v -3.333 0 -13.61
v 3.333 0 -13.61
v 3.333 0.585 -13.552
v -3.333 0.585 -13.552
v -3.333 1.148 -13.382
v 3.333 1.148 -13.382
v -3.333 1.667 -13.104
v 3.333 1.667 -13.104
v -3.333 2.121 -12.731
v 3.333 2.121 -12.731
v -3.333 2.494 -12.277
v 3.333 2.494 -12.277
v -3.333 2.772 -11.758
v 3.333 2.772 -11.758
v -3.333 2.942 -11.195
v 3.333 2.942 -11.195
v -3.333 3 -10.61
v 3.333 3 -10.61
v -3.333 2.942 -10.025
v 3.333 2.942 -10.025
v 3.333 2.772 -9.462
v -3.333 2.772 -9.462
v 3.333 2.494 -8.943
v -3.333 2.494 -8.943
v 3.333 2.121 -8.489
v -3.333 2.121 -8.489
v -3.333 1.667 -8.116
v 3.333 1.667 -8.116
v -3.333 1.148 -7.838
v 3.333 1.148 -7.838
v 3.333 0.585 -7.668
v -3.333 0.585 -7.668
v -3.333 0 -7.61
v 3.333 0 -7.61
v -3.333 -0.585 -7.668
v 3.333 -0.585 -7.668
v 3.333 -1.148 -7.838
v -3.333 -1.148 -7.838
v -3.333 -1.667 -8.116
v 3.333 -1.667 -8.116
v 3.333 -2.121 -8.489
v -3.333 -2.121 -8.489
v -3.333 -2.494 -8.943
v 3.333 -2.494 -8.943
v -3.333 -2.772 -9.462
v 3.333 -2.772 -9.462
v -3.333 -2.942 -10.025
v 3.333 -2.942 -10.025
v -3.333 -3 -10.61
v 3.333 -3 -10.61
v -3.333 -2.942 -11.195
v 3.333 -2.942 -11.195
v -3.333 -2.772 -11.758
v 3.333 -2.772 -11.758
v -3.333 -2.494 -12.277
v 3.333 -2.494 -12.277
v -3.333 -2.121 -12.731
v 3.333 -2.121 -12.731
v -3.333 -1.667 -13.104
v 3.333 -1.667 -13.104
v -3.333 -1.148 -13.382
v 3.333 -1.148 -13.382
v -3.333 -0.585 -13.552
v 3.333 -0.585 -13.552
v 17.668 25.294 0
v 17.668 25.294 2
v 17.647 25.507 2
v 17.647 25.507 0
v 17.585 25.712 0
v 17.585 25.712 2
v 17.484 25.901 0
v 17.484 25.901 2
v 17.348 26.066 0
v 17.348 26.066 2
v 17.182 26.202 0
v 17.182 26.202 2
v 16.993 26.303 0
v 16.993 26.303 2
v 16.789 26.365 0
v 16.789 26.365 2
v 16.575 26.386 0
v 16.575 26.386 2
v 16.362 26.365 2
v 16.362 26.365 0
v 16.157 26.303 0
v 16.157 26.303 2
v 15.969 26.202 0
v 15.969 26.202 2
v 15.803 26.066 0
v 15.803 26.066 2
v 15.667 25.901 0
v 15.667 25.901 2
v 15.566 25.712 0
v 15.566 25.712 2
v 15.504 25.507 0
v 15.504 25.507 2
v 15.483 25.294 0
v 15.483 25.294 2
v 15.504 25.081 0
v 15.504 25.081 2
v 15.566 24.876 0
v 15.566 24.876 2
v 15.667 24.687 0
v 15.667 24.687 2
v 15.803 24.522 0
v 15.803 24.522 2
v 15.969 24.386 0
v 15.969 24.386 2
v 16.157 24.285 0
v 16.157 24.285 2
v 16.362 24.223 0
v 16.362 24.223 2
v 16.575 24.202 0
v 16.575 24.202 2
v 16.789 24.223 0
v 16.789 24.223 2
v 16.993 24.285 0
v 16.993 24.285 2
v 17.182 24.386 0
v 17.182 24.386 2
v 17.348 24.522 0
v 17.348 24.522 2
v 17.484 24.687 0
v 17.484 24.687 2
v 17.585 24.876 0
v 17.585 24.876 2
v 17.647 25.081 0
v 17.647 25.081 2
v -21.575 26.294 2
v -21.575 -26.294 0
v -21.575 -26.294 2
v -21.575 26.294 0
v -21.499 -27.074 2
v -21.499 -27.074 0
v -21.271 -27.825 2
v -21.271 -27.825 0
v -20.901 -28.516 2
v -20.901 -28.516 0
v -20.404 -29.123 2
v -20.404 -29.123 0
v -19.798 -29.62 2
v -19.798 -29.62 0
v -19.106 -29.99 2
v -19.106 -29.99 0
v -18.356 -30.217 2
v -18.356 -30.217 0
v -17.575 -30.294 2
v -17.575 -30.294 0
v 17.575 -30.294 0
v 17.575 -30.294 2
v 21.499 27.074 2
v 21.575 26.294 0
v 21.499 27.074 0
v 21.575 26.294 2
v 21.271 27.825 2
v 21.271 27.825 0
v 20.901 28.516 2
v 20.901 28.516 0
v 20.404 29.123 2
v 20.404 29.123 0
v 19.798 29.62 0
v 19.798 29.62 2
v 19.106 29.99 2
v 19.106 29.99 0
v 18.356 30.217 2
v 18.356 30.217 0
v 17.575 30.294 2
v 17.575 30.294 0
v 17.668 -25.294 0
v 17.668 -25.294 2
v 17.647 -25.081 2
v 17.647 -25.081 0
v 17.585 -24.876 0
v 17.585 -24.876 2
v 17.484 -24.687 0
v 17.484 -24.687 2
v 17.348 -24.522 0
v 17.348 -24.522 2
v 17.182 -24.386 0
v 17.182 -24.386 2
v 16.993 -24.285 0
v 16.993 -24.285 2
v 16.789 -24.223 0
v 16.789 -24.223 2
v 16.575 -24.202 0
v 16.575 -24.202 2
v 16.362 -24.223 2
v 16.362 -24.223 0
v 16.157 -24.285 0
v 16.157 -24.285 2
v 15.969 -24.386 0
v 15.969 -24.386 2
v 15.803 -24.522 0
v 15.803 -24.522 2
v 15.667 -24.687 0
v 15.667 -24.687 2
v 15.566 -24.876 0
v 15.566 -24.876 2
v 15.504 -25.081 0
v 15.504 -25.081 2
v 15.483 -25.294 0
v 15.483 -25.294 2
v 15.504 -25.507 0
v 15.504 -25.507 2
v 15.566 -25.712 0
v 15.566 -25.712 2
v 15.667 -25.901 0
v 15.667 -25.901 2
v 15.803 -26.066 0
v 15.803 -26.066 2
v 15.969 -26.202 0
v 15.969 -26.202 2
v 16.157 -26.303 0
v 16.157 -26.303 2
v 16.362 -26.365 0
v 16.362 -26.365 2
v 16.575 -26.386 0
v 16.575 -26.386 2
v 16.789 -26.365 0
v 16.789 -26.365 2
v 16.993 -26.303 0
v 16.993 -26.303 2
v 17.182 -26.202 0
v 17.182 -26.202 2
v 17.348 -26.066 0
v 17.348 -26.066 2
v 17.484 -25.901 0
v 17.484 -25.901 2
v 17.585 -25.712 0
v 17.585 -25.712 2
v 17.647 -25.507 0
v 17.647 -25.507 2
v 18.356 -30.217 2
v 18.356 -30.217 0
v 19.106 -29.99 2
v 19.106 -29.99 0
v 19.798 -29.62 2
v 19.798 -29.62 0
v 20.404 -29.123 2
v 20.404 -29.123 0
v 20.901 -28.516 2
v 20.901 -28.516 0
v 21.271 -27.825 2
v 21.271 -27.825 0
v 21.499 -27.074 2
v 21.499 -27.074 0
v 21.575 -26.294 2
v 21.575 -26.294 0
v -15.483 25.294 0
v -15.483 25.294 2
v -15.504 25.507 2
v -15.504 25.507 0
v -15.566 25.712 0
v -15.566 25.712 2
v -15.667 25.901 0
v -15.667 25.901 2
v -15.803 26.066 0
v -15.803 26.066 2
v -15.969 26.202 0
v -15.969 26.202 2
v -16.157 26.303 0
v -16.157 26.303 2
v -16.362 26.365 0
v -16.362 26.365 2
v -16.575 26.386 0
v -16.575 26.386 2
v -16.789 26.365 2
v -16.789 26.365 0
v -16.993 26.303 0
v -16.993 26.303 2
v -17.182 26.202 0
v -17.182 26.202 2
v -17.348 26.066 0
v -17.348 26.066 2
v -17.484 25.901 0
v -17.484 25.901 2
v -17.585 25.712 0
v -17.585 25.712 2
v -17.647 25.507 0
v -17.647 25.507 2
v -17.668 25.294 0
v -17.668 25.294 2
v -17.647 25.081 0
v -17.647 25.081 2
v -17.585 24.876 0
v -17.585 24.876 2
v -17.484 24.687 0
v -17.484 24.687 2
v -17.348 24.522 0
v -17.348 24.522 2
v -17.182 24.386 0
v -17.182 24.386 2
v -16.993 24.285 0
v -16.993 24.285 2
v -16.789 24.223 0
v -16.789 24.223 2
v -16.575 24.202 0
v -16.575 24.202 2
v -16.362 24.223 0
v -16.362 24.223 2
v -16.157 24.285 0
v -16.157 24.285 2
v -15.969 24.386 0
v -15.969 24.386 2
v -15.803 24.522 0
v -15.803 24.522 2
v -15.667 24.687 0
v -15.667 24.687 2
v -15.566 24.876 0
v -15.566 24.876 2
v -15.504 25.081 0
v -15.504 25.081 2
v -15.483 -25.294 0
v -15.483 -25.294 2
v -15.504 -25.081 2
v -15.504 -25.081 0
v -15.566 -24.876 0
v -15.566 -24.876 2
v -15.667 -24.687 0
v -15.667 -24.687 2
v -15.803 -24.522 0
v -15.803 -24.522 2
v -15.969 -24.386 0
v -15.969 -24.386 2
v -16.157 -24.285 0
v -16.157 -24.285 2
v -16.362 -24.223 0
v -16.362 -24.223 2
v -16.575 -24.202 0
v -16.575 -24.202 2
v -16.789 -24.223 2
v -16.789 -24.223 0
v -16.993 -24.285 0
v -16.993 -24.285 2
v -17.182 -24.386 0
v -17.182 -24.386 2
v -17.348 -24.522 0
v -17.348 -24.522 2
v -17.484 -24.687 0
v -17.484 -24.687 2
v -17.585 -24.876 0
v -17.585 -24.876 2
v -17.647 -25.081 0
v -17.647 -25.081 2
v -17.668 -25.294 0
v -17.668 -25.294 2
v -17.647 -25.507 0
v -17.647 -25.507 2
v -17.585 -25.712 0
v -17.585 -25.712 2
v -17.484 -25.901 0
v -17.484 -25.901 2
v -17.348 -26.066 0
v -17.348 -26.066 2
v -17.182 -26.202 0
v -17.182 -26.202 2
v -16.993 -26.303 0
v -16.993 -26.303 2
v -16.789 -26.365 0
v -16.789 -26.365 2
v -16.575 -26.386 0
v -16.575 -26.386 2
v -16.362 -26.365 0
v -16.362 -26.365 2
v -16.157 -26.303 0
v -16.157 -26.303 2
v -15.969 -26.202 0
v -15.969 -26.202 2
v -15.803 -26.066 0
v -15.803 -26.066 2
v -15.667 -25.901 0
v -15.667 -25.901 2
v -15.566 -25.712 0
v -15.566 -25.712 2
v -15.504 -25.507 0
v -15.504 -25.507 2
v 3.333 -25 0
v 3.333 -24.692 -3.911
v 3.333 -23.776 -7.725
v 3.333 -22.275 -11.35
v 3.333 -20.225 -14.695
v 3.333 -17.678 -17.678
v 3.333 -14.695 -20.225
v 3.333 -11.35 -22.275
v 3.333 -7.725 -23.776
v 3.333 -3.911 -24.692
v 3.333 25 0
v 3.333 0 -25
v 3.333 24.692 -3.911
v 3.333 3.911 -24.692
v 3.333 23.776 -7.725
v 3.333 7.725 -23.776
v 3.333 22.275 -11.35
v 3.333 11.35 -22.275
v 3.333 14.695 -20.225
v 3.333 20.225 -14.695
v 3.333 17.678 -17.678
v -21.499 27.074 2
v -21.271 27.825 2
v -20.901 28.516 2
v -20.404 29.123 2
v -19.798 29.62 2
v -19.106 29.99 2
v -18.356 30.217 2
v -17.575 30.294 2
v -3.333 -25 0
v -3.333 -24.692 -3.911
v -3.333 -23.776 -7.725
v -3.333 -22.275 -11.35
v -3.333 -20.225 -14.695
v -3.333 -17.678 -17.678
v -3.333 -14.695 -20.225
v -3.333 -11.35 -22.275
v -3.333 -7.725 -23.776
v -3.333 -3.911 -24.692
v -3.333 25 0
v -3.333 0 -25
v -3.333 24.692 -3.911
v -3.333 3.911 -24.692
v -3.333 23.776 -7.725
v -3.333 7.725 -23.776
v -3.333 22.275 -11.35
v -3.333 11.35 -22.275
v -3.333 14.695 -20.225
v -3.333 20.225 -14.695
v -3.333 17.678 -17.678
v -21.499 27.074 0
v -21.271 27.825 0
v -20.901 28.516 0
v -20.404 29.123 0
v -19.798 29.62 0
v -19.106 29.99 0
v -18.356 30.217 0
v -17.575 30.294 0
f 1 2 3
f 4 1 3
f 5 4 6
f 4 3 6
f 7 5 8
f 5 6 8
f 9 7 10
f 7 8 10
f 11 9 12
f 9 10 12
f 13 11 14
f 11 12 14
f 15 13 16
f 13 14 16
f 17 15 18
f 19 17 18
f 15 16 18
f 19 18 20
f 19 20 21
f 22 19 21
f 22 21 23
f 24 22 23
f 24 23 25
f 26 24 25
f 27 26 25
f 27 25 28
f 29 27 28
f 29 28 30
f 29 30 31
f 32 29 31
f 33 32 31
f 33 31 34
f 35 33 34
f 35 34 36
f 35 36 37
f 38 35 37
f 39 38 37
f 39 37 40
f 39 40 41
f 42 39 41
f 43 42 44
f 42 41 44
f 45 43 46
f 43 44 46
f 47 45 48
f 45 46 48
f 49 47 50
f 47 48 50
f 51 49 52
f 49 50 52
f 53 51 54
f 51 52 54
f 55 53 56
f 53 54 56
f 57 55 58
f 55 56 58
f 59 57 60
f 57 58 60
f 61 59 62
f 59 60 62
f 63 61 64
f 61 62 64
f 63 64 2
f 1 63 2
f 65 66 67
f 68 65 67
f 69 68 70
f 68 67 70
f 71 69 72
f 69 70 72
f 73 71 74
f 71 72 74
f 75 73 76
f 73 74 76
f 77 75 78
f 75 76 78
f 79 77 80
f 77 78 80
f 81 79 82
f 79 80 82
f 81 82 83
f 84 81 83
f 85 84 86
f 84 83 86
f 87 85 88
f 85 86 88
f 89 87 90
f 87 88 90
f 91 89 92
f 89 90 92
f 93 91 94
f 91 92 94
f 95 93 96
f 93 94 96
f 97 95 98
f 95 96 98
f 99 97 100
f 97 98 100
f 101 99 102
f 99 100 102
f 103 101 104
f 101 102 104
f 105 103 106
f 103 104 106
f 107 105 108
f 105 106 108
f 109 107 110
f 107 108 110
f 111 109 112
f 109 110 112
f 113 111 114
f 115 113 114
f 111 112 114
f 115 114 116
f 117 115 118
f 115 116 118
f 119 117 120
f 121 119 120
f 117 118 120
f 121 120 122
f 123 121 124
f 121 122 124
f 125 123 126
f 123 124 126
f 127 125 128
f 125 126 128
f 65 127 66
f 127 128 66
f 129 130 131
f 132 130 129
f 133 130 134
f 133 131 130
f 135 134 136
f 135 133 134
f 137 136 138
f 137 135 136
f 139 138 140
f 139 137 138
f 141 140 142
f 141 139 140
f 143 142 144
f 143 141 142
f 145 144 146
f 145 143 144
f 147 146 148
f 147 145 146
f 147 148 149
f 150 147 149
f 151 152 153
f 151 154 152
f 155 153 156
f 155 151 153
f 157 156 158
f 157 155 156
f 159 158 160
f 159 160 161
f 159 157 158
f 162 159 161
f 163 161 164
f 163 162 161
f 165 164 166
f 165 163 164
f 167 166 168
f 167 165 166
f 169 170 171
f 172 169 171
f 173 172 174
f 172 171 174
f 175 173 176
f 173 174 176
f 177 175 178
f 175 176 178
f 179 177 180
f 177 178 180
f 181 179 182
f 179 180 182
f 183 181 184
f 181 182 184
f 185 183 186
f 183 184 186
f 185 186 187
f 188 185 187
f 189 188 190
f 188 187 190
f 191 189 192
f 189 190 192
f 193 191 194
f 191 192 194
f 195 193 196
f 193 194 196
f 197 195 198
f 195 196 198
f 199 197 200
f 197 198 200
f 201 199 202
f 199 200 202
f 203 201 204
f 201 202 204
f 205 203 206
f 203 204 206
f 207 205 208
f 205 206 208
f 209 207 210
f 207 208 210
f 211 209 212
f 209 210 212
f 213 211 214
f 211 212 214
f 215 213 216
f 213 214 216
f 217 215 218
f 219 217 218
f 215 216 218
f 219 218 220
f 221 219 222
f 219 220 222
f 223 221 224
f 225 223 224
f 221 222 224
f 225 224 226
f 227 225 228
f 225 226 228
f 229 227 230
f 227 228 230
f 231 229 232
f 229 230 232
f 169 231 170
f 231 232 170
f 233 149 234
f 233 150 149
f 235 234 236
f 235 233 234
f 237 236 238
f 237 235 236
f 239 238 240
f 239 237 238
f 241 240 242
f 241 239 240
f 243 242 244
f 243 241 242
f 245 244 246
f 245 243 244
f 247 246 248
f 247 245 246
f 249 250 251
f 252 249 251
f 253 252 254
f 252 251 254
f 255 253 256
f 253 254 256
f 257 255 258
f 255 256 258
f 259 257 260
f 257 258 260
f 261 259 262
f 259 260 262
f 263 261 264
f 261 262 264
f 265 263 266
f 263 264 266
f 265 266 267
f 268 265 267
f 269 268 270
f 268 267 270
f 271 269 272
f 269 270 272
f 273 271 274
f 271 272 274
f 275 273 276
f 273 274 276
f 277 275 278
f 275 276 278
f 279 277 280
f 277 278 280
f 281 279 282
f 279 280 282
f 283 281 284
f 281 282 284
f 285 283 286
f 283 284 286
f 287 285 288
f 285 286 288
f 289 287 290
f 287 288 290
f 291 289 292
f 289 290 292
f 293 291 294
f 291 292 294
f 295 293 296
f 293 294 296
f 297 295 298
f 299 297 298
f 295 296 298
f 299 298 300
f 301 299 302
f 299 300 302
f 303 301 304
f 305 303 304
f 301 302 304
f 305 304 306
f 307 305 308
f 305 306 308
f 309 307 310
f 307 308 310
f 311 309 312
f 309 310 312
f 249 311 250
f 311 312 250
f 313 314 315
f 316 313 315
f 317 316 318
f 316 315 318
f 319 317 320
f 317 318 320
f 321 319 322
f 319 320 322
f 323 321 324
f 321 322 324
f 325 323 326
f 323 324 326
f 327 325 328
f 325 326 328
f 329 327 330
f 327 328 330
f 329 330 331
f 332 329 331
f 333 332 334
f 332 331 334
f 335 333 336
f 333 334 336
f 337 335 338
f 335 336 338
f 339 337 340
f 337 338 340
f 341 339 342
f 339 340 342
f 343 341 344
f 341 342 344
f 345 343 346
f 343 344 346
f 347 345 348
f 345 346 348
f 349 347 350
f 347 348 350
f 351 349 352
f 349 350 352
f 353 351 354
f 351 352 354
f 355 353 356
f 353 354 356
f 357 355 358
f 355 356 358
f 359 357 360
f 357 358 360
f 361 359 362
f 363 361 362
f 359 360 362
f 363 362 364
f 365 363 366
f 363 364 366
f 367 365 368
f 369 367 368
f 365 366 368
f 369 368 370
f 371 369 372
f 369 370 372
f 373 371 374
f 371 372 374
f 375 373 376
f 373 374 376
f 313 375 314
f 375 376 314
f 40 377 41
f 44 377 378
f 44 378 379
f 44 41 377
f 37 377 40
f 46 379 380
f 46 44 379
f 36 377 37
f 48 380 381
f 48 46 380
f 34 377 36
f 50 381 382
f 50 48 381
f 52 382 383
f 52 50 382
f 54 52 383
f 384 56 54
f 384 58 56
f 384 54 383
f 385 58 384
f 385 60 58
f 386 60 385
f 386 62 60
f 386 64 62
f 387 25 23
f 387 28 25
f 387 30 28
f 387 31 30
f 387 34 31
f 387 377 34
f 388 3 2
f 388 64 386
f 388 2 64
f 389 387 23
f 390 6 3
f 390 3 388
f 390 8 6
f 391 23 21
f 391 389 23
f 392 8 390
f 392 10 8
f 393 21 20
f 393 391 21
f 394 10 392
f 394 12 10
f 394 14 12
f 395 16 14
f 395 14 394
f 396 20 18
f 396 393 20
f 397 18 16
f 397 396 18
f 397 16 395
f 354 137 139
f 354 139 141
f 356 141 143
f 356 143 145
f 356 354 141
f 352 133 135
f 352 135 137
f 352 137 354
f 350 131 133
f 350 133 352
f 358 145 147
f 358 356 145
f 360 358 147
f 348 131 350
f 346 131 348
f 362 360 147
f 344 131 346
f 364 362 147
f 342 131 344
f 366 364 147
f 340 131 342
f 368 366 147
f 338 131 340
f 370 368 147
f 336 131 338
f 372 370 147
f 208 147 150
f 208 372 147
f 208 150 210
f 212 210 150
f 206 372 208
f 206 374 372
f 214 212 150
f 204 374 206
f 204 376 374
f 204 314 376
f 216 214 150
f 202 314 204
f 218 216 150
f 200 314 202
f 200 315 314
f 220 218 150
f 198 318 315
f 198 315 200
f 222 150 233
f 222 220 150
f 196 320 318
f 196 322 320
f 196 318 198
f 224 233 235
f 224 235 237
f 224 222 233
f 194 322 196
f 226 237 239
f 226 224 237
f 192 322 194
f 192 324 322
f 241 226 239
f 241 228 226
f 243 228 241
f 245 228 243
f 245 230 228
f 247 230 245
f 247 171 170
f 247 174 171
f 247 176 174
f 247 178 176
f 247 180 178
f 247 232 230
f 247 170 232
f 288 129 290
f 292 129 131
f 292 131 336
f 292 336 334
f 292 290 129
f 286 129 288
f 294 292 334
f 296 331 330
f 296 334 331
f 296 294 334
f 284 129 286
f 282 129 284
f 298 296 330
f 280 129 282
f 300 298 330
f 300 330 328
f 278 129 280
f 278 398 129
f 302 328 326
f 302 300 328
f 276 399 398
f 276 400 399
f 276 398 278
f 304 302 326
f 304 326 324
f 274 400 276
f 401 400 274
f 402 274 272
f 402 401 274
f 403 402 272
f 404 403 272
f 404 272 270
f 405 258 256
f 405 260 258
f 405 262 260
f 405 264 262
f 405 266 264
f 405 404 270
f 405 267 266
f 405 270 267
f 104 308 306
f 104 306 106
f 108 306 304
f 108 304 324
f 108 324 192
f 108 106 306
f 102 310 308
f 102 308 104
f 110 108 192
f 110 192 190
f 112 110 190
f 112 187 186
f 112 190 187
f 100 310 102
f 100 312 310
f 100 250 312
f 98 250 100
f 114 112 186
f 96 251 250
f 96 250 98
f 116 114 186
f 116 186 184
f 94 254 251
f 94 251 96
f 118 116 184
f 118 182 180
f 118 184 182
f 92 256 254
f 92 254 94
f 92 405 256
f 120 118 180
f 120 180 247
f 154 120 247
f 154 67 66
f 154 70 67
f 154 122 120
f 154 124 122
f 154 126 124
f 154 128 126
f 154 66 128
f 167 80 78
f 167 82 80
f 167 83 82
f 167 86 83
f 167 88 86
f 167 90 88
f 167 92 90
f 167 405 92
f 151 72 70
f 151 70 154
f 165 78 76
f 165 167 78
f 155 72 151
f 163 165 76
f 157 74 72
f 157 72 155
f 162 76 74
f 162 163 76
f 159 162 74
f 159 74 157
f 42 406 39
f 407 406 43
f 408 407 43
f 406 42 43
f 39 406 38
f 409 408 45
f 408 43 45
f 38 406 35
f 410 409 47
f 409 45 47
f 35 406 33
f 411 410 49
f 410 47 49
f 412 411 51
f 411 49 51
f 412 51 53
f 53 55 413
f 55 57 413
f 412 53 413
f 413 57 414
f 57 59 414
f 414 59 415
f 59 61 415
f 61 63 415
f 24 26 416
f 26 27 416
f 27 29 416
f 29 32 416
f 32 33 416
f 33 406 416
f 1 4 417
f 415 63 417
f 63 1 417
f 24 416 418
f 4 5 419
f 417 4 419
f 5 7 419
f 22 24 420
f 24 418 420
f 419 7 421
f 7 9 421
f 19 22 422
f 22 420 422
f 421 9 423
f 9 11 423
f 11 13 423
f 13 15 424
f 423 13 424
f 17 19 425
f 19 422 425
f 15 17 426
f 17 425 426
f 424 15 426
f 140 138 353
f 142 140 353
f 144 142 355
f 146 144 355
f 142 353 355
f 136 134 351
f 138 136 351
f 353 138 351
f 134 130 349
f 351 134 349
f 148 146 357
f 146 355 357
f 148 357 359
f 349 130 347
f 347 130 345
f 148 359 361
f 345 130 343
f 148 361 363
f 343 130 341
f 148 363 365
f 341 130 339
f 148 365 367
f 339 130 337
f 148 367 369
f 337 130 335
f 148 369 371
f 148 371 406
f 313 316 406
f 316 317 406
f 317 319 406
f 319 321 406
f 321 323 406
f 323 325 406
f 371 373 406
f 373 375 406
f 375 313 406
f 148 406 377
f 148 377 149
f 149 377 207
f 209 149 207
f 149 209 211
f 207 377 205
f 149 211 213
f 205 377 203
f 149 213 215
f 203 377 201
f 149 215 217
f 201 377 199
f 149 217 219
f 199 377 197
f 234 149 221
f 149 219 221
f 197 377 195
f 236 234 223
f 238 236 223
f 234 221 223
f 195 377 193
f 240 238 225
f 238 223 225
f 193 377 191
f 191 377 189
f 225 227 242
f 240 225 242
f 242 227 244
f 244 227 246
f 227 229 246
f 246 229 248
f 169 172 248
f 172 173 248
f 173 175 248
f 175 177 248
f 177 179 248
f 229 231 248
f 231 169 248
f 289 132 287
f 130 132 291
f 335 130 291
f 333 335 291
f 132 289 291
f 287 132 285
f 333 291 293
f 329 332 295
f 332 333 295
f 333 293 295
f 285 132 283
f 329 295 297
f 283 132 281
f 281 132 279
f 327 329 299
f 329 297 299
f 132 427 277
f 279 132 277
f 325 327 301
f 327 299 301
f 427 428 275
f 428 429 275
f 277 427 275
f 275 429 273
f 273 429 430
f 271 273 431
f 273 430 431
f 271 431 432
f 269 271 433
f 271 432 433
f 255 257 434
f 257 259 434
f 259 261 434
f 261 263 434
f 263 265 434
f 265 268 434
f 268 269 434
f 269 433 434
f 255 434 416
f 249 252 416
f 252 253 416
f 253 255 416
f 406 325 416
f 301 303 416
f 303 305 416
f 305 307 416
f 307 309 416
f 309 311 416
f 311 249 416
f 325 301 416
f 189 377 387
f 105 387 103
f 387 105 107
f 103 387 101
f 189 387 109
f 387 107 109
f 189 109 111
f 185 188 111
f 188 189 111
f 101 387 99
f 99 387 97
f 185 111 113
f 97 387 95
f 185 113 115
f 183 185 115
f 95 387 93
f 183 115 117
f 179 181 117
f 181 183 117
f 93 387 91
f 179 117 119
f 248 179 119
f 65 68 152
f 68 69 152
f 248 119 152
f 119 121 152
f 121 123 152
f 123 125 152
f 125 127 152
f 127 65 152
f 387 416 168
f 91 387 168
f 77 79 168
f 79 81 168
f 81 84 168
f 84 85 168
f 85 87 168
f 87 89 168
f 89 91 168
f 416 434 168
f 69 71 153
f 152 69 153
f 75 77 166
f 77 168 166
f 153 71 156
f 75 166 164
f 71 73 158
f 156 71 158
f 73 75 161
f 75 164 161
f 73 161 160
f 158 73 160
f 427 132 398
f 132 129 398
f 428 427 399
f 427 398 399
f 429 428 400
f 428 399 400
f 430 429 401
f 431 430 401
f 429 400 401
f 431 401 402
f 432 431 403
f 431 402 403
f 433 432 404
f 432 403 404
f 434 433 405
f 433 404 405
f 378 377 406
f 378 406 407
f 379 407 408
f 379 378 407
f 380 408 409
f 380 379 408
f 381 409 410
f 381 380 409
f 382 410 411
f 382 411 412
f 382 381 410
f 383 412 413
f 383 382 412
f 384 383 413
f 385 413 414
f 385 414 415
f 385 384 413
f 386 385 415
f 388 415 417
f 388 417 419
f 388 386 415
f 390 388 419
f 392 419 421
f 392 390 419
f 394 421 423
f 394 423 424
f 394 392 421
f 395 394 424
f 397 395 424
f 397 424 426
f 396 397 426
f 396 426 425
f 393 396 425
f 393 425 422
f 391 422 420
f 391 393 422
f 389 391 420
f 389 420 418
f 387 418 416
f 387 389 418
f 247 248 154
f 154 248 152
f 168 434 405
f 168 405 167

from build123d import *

# Parameters (mm, degrees)
SKETCH1_W           = 43.1509
SKETCH1_H           = 60.58823
BOSS_EXTRUDE1_DEPTH = 2
FILLET1_R           = 4
SKETCH2_R           = 1.0922
CUT_EXTRUDE1_DEPTH  = 2
BOSS_EXTRUDE2_DEPTH = 3.333333333
CUT_EXTRUDE2_REACH  = 48.51
SKETCH6_R           = 3


with BuildPart() as part:
    # Sketch1 → Boss-Extrude1 (new body)
    with BuildSketch(Plane.XY):
        Rectangle(SKETCH1_W, SKETCH1_H)
    extrude(amount=BOSS_EXTRUDE1_DEPTH)

    # Fillet1
    fillet1_edges = [part.edges().sort_by_distance(p)[0] for p in [
        (21.57545, -30.294115, 1),
        (-21.57545, -30.294115, 1),
        (-21.57545, 30.294115, 1),
        (21.57545, 30.294115, 1),
    ]]
    fillet(fillet1_edges, radius=FILLET1_R)

    # Sketch2 → Cut-Extrude1 (cut)
    with BuildSketch(Plane.XY.offset(2)):
        with Locations((-16.57545, 25.294115)):
            Circle(SKETCH2_R)
        with Locations((16.57545, 25.294115)):
            Circle(SKETCH2_R)
        with Locations((-16.57545, -25.294115)):
            Circle(SKETCH2_R)
        with Locations((16.57545, -25.294115)):
            Circle(SKETCH2_R)
    extrude(amount=-CUT_EXTRUDE1_DEPTH, mode=Mode.SUBTRACT)

    # Sketch5 → Boss-Extrude2 (add, symmetric)
    with BuildSketch(Plane(origin=(0, 0, 0), x_dir=(0, 0, -1), z_dir=(1, 0, 0))):
        with BuildLine():
            Line((0, 25), (0, -25))
            ThreePointArc((0, -25), (25, 0), (0, 25))
        make_face()
    extrude(amount=BOSS_EXTRUDE2_DEPTH, both=True)

    # Sketch6 → Cut-Extrude2 (cut, up to next)
    with BuildSketch(Plane(origin=(3.333333333, 0, 0), x_dir=(0, 0, -1), z_dir=(1, 0, 0)), mode=Mode.PRIVATE) as cut_extrude2_sk1:
        with Locations((10.61, 0)):
            Circle(SKETCH6_R)
    cut_extrude2_tool1 = extrude(cut_extrude2_sk1.sketch, amount=-CUT_EXTRUDE2_REACH, mode=Mode.PRIVATE) & part.part
    add(cut_extrude2_tool1.solids().sort_by_distance((3.333333, 0, -10.61))[0], mode=Mode.SUBTRACT)


solid = part.part
